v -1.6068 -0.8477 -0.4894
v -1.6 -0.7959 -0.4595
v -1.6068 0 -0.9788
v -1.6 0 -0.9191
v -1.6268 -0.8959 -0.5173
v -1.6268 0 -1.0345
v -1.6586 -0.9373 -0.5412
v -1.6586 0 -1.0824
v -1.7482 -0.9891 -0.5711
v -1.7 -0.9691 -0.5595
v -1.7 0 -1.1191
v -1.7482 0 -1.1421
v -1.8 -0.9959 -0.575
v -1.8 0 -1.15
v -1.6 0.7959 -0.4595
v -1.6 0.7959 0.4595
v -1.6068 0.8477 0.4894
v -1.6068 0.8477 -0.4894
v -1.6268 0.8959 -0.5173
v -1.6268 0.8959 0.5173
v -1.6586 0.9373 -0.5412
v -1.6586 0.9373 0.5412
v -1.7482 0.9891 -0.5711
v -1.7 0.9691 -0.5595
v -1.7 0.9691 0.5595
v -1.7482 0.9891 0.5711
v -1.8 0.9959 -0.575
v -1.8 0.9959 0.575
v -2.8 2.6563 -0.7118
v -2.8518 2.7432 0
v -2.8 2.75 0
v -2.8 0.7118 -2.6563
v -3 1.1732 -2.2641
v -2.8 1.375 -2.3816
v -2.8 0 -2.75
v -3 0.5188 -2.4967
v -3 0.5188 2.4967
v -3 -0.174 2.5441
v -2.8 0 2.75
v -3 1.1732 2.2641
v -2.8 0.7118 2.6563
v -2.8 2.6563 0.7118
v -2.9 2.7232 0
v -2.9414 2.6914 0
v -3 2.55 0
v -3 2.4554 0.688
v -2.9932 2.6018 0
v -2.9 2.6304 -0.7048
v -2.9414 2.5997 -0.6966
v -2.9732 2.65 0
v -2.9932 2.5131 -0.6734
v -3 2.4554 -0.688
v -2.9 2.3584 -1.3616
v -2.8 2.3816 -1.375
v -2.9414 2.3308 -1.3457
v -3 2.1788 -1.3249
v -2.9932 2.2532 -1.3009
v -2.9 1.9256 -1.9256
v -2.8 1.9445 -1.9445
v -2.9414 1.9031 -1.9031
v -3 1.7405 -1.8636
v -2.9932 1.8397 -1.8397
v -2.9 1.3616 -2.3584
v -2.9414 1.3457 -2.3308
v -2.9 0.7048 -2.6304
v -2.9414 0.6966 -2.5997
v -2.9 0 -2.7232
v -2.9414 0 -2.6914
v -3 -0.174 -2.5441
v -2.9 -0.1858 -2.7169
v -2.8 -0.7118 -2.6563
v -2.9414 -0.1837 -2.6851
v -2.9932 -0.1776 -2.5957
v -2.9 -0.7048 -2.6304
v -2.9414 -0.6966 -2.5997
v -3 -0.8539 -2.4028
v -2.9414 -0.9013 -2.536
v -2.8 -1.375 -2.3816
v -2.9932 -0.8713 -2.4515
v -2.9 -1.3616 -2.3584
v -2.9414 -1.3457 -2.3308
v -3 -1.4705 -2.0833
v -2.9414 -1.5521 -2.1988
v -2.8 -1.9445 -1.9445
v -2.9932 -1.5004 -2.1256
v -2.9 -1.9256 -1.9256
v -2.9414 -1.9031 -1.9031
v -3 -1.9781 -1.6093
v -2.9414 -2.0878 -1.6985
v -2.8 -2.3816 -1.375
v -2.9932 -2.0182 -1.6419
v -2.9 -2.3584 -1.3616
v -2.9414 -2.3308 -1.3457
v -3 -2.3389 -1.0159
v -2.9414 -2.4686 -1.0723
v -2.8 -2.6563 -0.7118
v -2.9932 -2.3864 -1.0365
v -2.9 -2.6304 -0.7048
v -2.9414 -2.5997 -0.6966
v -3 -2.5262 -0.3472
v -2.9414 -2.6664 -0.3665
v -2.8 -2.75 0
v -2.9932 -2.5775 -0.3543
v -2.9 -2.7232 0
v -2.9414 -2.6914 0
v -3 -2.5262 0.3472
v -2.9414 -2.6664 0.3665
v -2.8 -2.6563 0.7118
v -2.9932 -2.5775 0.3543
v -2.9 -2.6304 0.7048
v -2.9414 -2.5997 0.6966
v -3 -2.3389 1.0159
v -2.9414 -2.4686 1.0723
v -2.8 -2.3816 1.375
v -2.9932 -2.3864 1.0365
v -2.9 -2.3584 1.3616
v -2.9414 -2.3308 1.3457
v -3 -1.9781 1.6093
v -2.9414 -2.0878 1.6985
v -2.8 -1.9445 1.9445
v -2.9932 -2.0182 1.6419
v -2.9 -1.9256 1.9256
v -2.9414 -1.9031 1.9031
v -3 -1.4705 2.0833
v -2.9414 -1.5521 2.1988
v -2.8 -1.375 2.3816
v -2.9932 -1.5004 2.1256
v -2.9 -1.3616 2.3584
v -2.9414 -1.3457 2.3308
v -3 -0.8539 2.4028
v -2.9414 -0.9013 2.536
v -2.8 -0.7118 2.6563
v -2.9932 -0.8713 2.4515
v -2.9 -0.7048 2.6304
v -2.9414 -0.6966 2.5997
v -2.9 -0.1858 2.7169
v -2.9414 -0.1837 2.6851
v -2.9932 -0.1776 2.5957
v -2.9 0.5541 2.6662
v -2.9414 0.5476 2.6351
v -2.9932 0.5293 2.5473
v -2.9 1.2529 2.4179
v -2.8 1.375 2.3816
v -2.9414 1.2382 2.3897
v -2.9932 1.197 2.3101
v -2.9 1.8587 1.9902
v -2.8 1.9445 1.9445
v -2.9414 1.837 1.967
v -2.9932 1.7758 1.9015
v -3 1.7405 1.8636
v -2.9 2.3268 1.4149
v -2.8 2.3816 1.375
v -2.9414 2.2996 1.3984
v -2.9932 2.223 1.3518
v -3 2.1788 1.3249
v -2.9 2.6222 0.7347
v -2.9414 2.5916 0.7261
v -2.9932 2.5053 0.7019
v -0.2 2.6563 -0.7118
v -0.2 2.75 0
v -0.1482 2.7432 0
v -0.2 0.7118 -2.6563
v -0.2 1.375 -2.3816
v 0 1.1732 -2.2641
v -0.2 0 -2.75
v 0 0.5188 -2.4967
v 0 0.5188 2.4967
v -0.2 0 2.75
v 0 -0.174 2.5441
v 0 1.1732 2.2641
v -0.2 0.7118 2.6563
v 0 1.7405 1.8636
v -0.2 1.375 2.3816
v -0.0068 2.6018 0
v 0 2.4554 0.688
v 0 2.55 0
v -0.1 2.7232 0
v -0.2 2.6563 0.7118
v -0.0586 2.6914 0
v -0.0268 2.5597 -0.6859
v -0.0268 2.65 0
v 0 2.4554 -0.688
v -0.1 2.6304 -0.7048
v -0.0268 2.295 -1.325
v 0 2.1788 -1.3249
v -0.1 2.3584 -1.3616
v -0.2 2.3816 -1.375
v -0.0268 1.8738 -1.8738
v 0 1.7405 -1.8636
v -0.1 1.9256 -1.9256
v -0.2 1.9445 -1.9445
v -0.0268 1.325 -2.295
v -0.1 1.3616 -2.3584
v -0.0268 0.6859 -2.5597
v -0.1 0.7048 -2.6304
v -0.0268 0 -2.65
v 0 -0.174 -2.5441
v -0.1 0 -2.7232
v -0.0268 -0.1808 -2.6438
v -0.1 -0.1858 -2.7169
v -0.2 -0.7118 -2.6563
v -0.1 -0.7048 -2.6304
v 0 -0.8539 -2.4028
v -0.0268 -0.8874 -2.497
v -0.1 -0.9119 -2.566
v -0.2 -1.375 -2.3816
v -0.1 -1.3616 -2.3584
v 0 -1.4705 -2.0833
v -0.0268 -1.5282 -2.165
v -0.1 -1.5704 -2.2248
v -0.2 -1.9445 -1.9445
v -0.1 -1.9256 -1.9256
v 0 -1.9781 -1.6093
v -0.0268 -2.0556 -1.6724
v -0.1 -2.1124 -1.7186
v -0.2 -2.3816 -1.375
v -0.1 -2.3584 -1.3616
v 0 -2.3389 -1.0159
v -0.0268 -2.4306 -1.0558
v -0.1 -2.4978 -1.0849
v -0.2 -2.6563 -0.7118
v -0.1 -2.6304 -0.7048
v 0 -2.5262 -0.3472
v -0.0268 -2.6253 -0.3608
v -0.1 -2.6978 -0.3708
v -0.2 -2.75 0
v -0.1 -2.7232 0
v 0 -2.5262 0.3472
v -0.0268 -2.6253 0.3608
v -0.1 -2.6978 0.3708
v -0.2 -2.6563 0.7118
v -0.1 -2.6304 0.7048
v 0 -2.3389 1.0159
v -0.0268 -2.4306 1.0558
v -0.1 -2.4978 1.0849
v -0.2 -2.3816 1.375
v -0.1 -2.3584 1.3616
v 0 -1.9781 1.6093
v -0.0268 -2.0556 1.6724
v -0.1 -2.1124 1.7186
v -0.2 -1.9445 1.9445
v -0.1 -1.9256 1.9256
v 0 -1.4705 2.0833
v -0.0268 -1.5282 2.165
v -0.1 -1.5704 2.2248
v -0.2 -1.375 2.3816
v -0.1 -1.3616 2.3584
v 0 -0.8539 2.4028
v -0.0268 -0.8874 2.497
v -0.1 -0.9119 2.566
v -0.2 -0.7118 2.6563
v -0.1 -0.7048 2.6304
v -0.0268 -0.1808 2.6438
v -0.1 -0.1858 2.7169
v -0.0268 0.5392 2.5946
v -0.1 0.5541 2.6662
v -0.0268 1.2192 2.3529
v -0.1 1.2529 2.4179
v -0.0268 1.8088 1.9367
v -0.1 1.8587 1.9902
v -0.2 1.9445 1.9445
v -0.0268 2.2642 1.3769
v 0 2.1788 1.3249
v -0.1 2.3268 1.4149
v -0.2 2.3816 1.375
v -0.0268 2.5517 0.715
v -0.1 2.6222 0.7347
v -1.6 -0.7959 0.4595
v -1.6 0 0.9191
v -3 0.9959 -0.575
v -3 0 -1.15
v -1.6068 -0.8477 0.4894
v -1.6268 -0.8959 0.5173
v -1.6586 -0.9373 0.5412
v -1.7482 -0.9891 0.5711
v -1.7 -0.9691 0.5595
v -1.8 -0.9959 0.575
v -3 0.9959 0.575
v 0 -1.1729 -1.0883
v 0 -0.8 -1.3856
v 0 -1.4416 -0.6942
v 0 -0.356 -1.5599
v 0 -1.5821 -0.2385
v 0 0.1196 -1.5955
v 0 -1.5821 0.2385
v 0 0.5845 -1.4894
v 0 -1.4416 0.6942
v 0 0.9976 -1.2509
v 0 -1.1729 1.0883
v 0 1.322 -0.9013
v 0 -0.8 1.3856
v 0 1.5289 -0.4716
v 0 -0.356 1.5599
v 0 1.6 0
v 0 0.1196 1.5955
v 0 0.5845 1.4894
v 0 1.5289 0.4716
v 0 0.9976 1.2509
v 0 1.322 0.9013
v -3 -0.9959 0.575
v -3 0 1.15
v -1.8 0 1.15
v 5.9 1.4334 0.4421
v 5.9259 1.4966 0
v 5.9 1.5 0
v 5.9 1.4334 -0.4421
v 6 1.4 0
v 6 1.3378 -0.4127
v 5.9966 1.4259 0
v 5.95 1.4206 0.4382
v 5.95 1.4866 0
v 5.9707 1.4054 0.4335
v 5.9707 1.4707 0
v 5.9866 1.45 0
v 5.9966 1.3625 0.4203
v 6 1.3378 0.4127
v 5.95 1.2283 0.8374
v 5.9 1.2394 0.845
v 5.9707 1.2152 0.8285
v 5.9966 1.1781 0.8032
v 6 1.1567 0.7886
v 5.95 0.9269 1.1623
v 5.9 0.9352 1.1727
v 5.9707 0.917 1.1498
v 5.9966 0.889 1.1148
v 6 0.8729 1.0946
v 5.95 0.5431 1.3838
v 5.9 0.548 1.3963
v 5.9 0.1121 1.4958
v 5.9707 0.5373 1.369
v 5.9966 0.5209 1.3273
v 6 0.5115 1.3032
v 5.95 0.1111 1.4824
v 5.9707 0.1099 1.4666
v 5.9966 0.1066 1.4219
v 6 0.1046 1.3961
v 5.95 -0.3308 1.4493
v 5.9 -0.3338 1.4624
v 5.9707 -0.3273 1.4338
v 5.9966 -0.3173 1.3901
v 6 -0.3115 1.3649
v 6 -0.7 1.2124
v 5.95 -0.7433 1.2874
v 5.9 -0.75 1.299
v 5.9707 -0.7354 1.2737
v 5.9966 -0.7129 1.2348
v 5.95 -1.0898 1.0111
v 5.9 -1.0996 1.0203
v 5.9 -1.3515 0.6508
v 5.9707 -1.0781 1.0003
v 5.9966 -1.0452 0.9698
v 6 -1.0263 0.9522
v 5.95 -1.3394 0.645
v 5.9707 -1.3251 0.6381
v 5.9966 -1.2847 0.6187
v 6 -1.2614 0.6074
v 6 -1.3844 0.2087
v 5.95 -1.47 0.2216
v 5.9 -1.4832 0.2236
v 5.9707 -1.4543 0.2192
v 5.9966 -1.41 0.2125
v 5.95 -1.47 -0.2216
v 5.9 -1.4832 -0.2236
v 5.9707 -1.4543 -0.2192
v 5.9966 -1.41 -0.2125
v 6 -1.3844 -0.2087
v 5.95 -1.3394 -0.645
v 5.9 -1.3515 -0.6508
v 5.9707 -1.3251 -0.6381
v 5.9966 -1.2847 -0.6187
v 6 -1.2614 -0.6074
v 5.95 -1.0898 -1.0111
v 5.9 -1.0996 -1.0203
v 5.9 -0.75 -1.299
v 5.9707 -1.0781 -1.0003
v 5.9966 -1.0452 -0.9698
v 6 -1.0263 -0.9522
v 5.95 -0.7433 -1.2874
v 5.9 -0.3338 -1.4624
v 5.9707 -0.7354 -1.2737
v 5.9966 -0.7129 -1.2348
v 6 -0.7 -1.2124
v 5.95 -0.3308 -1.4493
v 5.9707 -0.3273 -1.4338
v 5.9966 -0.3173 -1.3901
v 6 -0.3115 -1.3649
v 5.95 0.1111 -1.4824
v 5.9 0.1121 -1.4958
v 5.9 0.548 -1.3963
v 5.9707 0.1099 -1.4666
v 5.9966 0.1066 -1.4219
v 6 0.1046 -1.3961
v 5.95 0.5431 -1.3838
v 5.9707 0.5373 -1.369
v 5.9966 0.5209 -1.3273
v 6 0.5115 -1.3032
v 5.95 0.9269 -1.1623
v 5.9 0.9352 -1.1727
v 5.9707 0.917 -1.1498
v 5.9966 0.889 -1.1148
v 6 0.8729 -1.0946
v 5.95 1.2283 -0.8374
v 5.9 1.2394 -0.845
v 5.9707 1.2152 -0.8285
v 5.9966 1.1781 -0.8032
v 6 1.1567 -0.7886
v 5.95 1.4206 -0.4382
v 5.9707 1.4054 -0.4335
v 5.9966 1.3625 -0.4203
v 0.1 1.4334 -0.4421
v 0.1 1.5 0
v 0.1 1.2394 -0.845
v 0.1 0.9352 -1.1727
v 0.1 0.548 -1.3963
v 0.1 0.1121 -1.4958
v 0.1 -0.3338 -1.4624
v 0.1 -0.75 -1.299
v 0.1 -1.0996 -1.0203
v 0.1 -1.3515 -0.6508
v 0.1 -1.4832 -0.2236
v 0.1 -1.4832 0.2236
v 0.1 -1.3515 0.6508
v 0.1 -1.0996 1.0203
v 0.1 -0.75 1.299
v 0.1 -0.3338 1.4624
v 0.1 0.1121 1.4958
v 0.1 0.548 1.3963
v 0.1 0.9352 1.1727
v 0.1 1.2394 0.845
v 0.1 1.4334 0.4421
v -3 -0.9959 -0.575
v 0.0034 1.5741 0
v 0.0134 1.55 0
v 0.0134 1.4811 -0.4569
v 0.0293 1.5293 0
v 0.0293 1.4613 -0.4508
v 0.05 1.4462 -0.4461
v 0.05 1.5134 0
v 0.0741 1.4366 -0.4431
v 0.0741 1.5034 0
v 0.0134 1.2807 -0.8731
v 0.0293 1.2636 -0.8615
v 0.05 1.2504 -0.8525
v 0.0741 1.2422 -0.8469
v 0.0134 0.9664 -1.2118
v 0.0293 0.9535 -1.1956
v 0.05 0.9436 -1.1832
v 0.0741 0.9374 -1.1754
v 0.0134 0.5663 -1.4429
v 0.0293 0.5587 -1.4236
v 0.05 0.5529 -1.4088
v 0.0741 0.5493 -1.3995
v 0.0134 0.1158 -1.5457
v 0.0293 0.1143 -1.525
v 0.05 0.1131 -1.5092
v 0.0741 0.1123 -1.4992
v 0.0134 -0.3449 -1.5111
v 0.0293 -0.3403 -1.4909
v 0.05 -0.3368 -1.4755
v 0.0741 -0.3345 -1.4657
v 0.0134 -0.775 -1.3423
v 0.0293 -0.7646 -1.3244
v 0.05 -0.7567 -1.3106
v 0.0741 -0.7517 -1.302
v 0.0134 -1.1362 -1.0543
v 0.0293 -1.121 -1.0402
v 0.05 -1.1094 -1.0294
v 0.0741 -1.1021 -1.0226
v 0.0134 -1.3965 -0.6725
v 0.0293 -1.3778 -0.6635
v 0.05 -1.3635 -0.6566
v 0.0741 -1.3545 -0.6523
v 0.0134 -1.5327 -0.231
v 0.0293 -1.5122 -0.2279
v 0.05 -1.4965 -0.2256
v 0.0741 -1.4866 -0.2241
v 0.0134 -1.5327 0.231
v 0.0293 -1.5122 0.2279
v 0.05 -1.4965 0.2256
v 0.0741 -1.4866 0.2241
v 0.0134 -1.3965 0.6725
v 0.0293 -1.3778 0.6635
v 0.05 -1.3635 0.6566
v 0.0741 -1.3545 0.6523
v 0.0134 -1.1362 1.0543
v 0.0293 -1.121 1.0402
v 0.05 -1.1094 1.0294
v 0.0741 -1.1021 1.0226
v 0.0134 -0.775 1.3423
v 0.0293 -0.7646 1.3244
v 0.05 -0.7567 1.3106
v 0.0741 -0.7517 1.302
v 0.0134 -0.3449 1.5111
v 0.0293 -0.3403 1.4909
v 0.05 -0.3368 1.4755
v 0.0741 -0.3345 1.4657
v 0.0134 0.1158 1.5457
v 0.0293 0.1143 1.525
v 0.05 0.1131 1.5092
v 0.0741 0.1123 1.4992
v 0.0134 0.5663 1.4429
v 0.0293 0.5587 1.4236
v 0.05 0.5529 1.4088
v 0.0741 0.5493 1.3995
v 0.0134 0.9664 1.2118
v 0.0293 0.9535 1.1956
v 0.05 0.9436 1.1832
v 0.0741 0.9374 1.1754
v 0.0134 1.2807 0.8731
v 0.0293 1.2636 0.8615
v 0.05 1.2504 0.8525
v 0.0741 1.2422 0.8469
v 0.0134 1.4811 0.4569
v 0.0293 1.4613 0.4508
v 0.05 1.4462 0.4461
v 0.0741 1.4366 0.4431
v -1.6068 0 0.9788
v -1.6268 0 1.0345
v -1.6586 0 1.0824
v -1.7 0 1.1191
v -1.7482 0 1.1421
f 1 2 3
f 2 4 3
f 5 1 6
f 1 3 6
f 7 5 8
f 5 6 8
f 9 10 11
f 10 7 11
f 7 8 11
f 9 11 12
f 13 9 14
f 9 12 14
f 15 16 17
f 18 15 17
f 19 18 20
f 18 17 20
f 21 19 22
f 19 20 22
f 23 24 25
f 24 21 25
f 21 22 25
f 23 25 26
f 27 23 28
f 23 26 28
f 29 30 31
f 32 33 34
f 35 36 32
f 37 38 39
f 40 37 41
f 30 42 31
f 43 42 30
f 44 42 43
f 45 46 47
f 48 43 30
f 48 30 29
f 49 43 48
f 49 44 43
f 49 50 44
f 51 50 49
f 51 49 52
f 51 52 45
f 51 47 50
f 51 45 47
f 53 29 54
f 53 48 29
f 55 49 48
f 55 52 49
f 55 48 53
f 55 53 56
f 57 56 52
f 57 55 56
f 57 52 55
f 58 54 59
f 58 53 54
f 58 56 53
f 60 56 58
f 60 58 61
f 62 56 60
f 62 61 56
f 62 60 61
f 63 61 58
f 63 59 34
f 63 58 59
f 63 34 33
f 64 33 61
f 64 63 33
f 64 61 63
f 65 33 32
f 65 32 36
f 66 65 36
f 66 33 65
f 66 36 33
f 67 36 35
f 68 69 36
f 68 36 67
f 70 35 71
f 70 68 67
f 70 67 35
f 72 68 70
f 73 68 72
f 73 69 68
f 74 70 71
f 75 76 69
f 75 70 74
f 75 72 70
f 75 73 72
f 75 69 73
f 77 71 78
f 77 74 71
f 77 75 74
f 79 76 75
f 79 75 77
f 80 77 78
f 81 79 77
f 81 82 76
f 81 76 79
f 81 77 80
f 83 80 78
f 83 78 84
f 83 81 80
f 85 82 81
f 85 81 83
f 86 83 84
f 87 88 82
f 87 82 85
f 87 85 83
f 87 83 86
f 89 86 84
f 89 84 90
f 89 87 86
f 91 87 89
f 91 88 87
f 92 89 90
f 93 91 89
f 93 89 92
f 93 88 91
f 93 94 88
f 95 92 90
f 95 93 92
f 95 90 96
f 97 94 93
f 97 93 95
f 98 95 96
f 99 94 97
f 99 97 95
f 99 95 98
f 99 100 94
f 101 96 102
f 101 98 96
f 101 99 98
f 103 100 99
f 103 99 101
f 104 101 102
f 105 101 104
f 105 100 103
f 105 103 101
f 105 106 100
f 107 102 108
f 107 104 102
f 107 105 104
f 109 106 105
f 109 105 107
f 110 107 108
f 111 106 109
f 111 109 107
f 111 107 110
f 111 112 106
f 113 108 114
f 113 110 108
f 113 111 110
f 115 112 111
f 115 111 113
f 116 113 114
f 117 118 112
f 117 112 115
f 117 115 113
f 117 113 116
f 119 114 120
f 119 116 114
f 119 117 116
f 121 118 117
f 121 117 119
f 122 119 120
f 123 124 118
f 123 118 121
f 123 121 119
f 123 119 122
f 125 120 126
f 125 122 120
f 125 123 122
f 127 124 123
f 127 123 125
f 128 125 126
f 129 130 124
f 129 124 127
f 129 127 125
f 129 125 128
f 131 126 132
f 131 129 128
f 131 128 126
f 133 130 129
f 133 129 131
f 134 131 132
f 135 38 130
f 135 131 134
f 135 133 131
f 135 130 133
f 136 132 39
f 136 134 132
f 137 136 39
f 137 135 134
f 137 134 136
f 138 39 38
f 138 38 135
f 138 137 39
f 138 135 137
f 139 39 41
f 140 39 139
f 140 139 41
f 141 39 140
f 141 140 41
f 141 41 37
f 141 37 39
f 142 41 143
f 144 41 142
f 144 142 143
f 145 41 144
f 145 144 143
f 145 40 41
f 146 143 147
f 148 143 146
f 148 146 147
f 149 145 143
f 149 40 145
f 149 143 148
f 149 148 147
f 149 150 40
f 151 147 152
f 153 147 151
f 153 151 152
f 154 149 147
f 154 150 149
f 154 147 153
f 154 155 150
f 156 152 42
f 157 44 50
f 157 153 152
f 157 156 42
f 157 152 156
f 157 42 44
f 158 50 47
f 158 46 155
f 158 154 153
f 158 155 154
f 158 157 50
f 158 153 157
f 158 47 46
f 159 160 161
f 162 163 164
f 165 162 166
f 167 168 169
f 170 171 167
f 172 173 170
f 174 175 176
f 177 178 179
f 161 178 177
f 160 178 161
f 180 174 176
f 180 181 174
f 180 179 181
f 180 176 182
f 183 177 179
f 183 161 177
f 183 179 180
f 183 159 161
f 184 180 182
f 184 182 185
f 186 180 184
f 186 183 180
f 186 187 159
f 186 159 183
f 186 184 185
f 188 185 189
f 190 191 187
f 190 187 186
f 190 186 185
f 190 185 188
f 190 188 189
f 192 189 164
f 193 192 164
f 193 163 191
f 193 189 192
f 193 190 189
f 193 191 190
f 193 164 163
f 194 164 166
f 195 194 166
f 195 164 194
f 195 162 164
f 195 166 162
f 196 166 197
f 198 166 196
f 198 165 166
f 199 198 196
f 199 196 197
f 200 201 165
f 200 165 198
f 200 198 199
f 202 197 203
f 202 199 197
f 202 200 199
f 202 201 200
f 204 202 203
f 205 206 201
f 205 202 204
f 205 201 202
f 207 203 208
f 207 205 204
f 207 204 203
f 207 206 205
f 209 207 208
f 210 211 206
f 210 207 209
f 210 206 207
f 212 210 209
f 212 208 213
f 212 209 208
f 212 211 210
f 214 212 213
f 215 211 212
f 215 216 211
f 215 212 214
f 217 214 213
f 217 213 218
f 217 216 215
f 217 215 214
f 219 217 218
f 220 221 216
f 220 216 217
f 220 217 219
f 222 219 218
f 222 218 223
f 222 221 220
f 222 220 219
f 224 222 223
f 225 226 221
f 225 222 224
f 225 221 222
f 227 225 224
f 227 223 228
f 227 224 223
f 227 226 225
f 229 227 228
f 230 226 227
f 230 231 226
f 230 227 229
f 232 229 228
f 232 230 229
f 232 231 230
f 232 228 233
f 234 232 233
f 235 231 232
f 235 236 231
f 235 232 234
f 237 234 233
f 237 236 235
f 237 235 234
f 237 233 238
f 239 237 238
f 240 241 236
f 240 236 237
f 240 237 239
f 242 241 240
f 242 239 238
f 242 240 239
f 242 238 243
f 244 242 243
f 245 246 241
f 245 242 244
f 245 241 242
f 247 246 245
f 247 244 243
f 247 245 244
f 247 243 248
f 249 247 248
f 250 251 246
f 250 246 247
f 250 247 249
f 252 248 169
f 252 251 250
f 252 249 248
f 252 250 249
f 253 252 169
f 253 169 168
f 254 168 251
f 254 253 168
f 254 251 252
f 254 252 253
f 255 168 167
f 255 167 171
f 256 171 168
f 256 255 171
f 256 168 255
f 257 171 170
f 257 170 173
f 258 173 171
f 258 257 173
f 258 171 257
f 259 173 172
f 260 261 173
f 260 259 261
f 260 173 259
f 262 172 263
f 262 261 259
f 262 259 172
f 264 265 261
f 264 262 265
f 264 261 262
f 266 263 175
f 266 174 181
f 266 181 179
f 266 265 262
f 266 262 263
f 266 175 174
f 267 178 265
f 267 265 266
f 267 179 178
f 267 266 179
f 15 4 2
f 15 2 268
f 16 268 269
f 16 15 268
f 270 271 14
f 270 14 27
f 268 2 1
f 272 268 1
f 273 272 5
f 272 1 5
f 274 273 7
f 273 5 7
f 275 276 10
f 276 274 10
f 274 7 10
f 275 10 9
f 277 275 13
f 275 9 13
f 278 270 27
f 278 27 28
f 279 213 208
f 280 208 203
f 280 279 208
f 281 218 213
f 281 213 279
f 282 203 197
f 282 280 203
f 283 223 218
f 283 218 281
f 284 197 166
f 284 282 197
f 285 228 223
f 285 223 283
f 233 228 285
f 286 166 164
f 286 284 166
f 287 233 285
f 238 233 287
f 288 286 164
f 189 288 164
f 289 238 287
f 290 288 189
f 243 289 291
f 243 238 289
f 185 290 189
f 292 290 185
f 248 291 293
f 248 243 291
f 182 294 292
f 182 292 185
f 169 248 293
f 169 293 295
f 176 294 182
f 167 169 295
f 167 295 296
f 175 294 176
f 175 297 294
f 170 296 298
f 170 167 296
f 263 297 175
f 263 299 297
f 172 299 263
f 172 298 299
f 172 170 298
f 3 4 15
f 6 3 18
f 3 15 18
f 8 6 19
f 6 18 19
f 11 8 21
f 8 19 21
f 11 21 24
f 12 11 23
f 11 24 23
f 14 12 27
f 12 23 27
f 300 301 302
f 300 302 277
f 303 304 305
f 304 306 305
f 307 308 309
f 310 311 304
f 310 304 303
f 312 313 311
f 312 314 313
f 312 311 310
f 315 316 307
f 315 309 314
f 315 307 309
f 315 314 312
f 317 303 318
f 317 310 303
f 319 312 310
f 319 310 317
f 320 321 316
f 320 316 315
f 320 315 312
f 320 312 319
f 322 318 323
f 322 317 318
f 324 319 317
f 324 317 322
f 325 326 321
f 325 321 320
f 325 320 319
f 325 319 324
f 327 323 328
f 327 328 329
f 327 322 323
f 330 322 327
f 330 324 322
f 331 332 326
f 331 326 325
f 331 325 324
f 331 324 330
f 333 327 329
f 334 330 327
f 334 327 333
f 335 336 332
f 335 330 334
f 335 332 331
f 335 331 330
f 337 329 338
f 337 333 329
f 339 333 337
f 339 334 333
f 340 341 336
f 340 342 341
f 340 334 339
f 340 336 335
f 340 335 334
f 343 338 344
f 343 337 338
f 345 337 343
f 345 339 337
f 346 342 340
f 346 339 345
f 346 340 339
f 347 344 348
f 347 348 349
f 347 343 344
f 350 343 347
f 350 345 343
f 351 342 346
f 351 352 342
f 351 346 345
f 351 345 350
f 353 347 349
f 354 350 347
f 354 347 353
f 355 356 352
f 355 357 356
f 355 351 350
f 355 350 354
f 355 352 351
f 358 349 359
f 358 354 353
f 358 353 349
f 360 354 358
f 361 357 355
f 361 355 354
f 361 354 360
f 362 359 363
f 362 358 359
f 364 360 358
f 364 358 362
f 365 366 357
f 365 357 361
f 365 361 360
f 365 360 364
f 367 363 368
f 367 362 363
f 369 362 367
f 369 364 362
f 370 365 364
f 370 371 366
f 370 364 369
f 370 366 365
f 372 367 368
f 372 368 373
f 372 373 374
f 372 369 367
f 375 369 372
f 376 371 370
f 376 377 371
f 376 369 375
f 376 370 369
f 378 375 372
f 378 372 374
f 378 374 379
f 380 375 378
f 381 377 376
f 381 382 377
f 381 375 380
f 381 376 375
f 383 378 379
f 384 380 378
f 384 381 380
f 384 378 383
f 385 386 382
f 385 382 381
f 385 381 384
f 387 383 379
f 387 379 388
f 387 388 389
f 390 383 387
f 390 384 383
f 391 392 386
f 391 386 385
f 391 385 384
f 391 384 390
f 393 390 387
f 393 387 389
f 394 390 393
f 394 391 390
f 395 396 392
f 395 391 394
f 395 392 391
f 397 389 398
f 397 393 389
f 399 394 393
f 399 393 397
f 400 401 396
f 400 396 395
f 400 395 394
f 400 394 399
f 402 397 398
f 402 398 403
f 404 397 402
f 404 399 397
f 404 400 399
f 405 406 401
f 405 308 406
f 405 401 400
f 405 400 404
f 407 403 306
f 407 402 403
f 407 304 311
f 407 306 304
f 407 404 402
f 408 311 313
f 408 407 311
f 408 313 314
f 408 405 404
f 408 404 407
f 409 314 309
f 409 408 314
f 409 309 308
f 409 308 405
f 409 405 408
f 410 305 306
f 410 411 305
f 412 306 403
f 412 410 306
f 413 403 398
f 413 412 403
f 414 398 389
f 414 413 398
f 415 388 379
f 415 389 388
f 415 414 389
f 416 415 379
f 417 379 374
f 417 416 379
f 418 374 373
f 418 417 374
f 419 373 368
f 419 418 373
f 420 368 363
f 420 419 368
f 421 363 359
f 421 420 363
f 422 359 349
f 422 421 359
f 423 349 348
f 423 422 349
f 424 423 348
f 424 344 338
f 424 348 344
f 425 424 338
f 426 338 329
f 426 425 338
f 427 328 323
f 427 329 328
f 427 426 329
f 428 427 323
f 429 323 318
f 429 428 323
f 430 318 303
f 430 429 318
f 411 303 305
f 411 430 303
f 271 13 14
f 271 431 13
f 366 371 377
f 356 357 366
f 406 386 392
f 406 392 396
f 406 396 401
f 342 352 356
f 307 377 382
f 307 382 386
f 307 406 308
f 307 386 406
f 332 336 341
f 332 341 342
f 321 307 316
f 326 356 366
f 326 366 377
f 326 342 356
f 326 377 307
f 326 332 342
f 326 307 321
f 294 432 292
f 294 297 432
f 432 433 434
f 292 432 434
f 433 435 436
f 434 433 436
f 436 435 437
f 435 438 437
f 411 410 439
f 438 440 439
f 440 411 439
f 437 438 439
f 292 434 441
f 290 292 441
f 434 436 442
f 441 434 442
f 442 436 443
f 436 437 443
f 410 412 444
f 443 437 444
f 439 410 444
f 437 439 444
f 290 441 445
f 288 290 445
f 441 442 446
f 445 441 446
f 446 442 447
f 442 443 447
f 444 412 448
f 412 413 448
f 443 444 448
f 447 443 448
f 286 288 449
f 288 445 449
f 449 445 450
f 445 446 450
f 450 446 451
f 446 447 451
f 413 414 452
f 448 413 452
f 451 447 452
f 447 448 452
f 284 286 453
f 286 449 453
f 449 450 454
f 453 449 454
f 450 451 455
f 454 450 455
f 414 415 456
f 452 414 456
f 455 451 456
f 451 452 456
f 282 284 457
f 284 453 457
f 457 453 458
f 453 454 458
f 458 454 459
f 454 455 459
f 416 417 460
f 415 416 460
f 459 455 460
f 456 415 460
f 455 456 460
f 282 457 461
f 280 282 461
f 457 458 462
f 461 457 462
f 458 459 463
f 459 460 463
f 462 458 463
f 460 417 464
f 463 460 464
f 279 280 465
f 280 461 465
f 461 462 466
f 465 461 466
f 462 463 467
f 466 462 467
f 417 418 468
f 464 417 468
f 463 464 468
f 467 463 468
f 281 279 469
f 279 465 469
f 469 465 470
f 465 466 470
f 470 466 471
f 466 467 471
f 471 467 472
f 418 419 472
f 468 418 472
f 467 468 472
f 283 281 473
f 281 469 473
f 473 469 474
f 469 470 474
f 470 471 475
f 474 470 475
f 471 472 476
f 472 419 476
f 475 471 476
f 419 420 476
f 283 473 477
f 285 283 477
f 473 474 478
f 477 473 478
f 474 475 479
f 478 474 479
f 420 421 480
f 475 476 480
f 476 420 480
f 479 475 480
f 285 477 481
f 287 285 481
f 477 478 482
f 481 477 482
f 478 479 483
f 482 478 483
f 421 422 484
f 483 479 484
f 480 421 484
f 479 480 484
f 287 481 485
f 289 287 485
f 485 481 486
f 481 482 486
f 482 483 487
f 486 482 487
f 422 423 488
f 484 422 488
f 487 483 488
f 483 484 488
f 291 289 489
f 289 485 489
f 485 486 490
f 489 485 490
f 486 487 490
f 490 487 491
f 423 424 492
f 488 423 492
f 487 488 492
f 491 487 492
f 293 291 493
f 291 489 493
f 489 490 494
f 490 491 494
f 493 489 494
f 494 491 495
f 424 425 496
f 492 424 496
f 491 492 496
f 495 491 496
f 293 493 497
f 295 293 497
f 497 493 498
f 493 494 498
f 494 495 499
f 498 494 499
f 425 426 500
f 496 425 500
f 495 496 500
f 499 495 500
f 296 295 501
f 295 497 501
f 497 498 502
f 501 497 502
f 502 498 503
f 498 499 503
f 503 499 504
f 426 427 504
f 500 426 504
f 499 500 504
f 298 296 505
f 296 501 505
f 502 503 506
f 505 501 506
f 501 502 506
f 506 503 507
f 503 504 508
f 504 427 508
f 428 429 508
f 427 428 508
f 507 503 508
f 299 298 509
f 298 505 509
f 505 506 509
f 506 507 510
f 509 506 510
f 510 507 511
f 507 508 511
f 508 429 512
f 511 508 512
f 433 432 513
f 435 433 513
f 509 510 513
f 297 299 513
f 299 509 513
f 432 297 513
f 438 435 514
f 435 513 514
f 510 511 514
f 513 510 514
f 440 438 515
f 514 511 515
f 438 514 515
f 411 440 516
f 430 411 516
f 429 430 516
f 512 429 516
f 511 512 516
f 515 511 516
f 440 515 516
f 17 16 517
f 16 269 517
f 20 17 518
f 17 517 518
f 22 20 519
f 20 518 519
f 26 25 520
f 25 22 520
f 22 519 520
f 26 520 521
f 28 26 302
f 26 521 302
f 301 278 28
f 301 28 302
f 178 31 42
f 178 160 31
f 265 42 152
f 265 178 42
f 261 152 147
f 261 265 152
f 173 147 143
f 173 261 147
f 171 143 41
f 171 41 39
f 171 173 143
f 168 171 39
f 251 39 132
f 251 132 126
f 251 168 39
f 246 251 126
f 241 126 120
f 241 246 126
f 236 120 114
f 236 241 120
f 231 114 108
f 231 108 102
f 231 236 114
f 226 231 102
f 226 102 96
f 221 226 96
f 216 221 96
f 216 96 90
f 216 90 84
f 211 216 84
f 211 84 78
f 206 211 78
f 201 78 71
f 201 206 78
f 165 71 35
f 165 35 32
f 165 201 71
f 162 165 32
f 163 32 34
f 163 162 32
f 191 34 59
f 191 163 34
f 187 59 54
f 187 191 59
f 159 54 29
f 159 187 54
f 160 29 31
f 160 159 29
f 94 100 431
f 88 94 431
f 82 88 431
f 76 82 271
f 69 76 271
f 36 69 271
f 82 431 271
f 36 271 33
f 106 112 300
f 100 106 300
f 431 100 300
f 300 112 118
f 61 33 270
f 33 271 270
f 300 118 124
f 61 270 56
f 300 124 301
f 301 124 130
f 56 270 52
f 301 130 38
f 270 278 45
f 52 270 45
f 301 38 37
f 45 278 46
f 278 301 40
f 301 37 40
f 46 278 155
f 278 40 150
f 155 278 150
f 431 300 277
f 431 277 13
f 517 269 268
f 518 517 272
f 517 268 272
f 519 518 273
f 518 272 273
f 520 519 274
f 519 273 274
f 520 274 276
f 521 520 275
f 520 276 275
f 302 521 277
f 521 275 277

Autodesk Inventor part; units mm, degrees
ref_plane "YZ Plane" through (0, 0, 0) normal (1, 0, 0) x (0, 1, 0)
ref_plane "XZ Plane" through (0, 0, 0) normal (0, 1, 0) x (-1, 0, 0)
ref_plane "XY Plane" through (0, 0, 0) normal (0, 0, 1) x (1, 0, 0)
sketch "スケッチ1" plane through (0, 0, 0) normal (0, 0, 1) x (1, 0, 0)
  line L0 (0, 0) -> (6, 0)
  line L1 (6, 0) -> (6, 1.5)
  line L2 (6, 1.5) -> (0, 1.5)
  line L3 (0, 1.5) -> (0, 0)
  line L4 (0, 0) -> (0, 2.75)
  line L5 (0, 0) -> (-3, 0)
  line L6 (-3, 0) -> (0, 0)
  line L7 (-3, 0) -> (-3, 1.15)
  line L8 (0, 0) -> (-3, 0)
  line L9 (-3, 0) -> (-3, 2.75)
  line L10 (-3, 2.75) -> (0, 2.75)
  line L11 (0, 2.75) -> (0, 0)
  dimension "d0" = 1.5
  dimension "d1" = 6
  dimension "d3" = 3
  dimension "d4" = 2.75
  dimension "d5" = 1.15
revolve "回転1" add sketch "スケッチ1" angle 360 about axis through (-3, 0, 0) along (1, 0, 0)
thread "ねじ1" size "M3x0.5" class "6g" standard "ANSI Metric M Profile" length 100
sketch "スケッチ2" plane through (-3, 0, 0) normal (-1, 0, 0) x (0, 0, 1)
  circle A0 centre (0, 0) radius 1.15 projected
  line L0 (-0.575, 0.9959) -> (0.575, 0.9959)
  line L1 (0.575, 0.9959) -> (1.15, 0)
  line L2 (1.15, 0) -> (0.575, -0.9959)
  line L3 (0.575, -0.9959) -> (-0.575, -0.9959)
  line L4 (-0.575, -0.9959) -> (-1.15, 0)
  line L5 (-1.15, 0) -> (-0.575, 0.9959)
  dimension "d10" = 1.15
  dimension "d11" = 1.9919
extrude "押し出し1" cut sketch "スケッチ2" against normal blind 1.4 contours L2 L3 L4 L5 L0 L1
fillet "フィレット1" radius 0.2 8 edges at (-1.6, 0.9959, 0) (-1.6, 0.498, 0.8625) (-1.6, 0.498, -0.8625) (-1.6, -0.498, -0.8625) (-1.6, -0.9959, 0) (-1.6, -0.498, 0.8625) (-3, -2.75, 0) (0, -2.75, 0)
fillet "フィレット2" radius 0.1 1 edges at (0, -1.5, 0)
fillet "フィレット3" radius 0.1 1 edges at (6, -1.5, 0)
properties part number "ネジアルミM3L6" material "アルミニウム 7075"
